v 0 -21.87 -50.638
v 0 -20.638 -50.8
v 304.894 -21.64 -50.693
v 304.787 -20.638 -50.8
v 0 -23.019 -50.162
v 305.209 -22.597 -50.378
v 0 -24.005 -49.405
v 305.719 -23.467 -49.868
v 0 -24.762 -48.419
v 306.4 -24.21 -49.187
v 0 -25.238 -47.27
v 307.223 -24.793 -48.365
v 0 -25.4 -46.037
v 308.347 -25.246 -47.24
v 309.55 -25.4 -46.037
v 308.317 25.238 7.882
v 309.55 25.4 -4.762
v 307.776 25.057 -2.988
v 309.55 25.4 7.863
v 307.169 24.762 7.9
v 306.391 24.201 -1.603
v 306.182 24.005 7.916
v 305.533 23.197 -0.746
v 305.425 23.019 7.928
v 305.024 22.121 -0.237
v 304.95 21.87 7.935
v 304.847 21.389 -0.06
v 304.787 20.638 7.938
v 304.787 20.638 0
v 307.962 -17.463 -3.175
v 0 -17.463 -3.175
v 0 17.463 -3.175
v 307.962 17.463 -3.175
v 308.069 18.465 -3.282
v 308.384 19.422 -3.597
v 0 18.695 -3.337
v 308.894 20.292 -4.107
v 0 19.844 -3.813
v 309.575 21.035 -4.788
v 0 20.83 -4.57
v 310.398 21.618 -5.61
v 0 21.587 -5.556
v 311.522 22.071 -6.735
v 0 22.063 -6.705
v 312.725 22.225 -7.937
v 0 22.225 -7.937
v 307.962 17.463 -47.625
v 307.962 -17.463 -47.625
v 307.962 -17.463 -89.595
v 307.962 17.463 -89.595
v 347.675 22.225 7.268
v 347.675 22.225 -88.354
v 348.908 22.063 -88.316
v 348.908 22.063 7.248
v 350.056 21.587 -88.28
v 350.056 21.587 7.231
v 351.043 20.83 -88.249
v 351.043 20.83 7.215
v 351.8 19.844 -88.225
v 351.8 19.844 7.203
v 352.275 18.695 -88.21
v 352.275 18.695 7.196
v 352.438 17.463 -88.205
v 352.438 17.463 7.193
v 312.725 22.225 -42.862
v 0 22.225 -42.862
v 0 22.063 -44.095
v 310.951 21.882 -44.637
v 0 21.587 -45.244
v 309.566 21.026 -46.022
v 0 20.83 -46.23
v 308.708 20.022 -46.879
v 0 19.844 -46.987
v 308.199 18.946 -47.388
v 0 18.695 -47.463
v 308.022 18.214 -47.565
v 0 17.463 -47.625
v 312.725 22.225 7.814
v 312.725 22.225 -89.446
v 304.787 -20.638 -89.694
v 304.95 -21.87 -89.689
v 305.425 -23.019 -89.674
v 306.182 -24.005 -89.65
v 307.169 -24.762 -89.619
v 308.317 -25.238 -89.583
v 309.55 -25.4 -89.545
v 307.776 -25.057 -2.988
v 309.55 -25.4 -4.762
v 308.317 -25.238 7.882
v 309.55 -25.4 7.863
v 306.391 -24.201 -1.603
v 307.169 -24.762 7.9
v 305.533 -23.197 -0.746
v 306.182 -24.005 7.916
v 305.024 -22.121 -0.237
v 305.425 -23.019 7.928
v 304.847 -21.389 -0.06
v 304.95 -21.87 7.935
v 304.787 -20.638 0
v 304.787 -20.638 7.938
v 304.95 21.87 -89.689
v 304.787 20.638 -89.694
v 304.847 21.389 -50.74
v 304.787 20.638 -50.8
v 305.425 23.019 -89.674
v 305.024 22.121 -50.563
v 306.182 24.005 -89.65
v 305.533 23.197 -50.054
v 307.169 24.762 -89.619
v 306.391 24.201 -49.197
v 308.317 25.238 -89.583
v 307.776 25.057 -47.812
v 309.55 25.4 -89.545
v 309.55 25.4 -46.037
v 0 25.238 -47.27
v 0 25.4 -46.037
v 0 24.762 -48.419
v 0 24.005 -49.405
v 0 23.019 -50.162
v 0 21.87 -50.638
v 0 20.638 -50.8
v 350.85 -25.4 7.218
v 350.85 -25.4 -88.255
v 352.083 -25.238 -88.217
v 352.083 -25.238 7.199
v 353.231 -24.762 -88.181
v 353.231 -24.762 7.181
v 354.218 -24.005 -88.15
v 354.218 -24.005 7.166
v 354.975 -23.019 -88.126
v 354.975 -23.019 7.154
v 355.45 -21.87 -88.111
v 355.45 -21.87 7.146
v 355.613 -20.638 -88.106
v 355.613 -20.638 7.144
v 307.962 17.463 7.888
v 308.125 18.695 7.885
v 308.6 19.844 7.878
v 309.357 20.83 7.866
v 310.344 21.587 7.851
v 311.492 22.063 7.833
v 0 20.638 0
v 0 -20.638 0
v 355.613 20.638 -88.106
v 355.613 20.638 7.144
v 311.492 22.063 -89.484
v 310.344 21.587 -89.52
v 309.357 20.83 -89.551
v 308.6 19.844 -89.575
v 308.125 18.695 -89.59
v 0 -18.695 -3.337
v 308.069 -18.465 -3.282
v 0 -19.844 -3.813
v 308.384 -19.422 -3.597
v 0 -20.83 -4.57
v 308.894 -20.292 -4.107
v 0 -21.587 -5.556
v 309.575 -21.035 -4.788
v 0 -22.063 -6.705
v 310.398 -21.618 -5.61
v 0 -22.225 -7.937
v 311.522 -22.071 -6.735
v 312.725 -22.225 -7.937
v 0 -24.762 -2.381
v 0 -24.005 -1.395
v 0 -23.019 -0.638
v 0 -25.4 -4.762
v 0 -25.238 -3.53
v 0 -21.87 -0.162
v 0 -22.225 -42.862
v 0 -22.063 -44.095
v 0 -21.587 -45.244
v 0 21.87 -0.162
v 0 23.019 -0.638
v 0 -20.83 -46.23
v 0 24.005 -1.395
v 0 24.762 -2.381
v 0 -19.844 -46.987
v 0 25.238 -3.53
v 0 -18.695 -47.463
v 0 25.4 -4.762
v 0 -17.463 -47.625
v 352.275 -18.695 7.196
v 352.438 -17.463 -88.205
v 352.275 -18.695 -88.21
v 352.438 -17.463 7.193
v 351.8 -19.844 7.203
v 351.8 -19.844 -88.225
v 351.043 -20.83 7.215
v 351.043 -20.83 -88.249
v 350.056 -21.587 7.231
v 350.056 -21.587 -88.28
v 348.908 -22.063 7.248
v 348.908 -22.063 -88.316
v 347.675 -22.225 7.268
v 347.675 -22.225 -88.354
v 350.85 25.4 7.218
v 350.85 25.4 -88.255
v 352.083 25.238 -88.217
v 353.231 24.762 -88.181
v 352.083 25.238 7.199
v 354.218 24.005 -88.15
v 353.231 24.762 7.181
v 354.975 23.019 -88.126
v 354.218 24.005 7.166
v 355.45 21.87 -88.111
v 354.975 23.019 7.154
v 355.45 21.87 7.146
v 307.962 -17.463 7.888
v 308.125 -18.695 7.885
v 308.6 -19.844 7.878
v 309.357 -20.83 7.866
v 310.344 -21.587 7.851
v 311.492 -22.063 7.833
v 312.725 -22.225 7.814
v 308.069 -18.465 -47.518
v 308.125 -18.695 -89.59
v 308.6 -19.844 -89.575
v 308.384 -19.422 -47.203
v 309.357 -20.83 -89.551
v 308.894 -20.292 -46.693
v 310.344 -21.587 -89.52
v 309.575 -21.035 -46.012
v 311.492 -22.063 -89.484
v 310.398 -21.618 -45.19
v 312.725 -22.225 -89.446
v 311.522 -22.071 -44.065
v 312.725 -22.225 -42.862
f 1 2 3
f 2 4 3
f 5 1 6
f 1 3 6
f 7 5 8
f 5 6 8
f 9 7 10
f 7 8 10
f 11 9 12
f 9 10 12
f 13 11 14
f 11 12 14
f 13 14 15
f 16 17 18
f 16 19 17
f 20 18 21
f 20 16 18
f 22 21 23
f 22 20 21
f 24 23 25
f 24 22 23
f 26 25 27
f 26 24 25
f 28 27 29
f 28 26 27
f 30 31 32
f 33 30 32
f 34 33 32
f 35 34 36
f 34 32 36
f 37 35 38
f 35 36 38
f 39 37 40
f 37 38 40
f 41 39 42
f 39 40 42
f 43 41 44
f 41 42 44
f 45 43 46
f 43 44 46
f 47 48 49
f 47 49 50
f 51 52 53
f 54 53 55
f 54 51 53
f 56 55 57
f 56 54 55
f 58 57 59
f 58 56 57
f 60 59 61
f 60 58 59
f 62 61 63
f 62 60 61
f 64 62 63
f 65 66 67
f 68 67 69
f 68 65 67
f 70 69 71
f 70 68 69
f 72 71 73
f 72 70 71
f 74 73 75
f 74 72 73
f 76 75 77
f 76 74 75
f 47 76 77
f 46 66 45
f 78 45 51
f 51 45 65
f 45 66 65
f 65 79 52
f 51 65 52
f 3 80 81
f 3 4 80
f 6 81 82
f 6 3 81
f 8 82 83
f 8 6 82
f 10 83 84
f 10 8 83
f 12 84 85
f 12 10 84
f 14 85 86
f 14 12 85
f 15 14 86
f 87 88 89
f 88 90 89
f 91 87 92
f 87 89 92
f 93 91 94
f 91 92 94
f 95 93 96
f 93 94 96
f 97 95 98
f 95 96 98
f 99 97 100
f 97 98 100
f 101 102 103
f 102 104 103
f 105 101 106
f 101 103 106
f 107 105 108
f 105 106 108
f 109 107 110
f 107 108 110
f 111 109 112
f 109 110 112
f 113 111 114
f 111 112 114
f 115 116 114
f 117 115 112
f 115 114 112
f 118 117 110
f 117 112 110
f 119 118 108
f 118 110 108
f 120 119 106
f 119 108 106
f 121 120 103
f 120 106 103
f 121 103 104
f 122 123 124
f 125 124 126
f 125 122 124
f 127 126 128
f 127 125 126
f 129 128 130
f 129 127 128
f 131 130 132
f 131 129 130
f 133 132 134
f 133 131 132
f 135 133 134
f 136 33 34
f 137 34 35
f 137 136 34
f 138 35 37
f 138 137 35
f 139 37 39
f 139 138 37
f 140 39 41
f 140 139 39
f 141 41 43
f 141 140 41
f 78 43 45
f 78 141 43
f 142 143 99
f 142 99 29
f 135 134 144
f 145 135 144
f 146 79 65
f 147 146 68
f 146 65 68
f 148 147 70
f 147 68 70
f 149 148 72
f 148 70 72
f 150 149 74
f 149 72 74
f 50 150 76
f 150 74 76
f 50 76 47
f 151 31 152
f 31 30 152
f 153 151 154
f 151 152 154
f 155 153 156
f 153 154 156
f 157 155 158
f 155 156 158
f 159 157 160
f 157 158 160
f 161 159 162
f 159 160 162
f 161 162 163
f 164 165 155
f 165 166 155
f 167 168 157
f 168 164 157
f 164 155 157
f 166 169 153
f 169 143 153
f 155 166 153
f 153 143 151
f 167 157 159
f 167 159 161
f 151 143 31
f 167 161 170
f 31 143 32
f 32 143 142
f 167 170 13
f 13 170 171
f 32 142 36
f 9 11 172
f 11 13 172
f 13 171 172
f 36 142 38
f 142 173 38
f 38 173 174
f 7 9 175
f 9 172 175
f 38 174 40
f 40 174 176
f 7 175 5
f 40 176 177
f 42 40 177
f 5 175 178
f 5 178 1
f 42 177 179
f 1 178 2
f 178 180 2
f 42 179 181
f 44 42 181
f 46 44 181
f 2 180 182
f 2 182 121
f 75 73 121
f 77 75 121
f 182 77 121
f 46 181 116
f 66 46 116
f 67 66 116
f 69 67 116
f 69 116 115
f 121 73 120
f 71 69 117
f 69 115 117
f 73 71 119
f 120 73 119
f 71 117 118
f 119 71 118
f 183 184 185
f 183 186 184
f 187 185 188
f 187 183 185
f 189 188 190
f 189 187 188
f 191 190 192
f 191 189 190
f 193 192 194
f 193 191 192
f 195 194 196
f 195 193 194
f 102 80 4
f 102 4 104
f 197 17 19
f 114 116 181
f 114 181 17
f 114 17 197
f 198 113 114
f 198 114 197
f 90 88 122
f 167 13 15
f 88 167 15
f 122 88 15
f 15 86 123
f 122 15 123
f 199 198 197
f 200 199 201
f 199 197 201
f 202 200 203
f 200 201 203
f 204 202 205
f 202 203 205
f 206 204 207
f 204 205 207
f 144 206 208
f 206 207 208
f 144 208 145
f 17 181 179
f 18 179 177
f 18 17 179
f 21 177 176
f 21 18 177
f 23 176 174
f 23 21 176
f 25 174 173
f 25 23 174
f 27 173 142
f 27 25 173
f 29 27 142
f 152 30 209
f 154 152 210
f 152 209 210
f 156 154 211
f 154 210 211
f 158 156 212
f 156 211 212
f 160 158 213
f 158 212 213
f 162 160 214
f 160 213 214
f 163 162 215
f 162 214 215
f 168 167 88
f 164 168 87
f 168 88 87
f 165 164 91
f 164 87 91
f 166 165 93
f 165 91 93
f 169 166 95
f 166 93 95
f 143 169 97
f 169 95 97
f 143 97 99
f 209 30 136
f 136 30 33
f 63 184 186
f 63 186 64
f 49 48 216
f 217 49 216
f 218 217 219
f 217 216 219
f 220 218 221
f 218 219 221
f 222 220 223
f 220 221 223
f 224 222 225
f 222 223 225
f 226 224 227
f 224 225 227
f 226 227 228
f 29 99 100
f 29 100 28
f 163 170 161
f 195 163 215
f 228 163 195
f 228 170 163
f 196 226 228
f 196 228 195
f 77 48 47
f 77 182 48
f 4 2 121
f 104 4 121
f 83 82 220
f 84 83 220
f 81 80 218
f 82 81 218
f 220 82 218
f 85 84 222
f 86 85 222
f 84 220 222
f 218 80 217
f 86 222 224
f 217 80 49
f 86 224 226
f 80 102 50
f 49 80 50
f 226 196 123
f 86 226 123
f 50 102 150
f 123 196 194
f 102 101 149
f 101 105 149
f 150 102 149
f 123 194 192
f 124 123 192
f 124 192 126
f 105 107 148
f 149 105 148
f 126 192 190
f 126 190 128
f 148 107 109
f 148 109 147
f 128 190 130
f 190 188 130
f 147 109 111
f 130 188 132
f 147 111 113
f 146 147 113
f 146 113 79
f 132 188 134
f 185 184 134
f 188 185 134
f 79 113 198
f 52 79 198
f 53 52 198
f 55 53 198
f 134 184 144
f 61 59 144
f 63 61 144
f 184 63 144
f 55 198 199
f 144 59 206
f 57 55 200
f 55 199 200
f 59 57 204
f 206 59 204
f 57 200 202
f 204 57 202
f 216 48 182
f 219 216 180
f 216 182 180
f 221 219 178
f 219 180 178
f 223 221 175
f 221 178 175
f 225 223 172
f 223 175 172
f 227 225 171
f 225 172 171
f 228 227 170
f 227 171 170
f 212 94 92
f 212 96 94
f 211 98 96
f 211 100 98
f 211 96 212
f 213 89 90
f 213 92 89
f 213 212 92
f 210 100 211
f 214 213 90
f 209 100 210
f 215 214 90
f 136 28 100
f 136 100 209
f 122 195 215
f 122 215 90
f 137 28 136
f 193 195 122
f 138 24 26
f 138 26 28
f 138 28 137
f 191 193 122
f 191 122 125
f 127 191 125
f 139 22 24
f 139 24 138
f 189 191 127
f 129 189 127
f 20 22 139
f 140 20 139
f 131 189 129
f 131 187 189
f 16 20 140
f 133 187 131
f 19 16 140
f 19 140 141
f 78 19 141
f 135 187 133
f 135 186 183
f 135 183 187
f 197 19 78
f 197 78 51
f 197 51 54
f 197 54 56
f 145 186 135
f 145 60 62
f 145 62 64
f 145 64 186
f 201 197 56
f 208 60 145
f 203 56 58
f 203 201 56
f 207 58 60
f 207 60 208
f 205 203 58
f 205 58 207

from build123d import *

# Parameters (mm, degrees)
SKETCH1_W                = 50.8
SKETCH1_H                = 50.8
SKETCH1_W_2              = 44.45
SKETCH1_H_2              = 44.45
BOSS_EXTRUDE1_DEPTH      = 304.8
BOSS_EXTRUDE2_DEPTH      = 7.9375
BOSS_EXTRUDE2_DEPTH_BACK = 89.69375
SKETCH2_W                = 50.8254
SKETCH2_H                = 50.8
SKETCH2_W_2              = 44.4754
SKETCH2_H_2              = 44.45
CUT_EXTRUDE1_DEPTH       = 371.251267642
FILLET1_R                = 4.7625
CUT_EXTRUDE2_START       = 304.7873
SKETCH1_3_W              = 44.45
SKETCH1_3_H              = 44.45
CUT_EXTRUDE2_DEPTH       = 3.175
FILLET3_R                = 4.7625


with BuildPart() as part:
    # Sketch1 → Boss-Extrude1 (new body)
    with BuildSketch(Plane(origin=(0, 0, 0), x_dir=(0, 0, -1), z_dir=(1, 0, 0))):
        with Locations((25.4, 0)):
            Rectangle(SKETCH1_W, SKETCH1_H)
        with Locations((25.4, 0)):
            Rectangle(SKETCH1_W_2, SKETCH1_H_2, mode=Mode.SUBTRACT)
    extrude(amount=BOSS_EXTRUDE1_DEPTH)

    # Sketch2 → Boss-Extrude2 (add, two sides: drawn at the far end of the back side and taken through both)
    with BuildSketch(Plane.XY.offset(-BOSS_EXTRUDE2_DEPTH_BACK)):
        with Locations((330.2, 0)):
            Rectangle(SKETCH2_W, SKETCH2_H)
        with Locations((330.2, 0)):
            Rectangle(SKETCH2_W_2, SKETCH2_H_2, mode=Mode.SUBTRACT)
    extrude(amount=BOSS_EXTRUDE2_DEPTH + BOSS_EXTRUDE2_DEPTH_BACK)

    # Sketch3 → Cut-Extrude1 (cut, through all)
    with BuildSketch(Plane(origin=(0, 25.4, 0), x_dir=(1, 0, 0), z_dir=(0, 1, 0))):
        Polygon((304.7873, 89.69375), (355.6127, 88.10625), (355.6127, 89.69375), align=None)
        Polygon((304.7873, -7.9375), (355.6127, -7.14375), (355.6127, -7.9375), align=None)
    extrude(amount=-CUT_EXTRUDE1_DEPTH, mode=Mode.SUBTRACT)

    # Fillet1
    fillet1_edges = [part.edges().sort_by_distance(p)[0] for p in [
        (152.39365, -25.4, 0),
        (152.39365, 25.4, 0),
        (152.39365, 25.4, -50.8),
        (152.39365, -25.4, -50.8),
        (304.7873, -25.4, -70.246875),
        (304.7873, -25.4, 3.96875),
        (304.7873, 25.4, -70.246875),
        (304.7873, 25.4, 3.96875),
        (355.6127, 25.4, -40.48125),
        (355.6127, -25.4, -40.48125),
    ]]
    fillet(fillet1_edges, radius=FILLET1_R)

    # Sketch1<3> → Cut-Extrude2 (cut)
    with BuildSketch(Plane(origin=(0, 0, 0), x_dir=(0, 0, -1), z_dir=(1, 0, 0)).offset(CUT_EXTRUDE2_START)):
        with Locations((25.4, 0)):
            Rectangle(SKETCH1_3_W, SKETCH1_3_H)
    extrude(amount=CUT_EXTRUDE2_DEPTH, mode=Mode.SUBTRACT)

    # Fillet3
    fillet3_edges = [part.edges().sort_by_distance(p)[0] for p in [
        (307.9623, 22.225, 2.356457709),
        (307.9623, -22.225, 2.356457709),
        (153.98115, -22.225, -47.625),
        (153.98115, 22.225, -47.625),
        (153.98115, 22.225, -3.175),
        (153.98115, -22.225, -3.175),
        (307.9623, -22.225, -68.609790417),
        (352.4377, -22.225, -40.506042291),
        (352.4377, 22.225, -40.506042291),
        (307.9623, 22.225, -68.609790417),
    ]]
    fillet(fillet3_edges, radius=FILLET3_R)


solid = part.part
